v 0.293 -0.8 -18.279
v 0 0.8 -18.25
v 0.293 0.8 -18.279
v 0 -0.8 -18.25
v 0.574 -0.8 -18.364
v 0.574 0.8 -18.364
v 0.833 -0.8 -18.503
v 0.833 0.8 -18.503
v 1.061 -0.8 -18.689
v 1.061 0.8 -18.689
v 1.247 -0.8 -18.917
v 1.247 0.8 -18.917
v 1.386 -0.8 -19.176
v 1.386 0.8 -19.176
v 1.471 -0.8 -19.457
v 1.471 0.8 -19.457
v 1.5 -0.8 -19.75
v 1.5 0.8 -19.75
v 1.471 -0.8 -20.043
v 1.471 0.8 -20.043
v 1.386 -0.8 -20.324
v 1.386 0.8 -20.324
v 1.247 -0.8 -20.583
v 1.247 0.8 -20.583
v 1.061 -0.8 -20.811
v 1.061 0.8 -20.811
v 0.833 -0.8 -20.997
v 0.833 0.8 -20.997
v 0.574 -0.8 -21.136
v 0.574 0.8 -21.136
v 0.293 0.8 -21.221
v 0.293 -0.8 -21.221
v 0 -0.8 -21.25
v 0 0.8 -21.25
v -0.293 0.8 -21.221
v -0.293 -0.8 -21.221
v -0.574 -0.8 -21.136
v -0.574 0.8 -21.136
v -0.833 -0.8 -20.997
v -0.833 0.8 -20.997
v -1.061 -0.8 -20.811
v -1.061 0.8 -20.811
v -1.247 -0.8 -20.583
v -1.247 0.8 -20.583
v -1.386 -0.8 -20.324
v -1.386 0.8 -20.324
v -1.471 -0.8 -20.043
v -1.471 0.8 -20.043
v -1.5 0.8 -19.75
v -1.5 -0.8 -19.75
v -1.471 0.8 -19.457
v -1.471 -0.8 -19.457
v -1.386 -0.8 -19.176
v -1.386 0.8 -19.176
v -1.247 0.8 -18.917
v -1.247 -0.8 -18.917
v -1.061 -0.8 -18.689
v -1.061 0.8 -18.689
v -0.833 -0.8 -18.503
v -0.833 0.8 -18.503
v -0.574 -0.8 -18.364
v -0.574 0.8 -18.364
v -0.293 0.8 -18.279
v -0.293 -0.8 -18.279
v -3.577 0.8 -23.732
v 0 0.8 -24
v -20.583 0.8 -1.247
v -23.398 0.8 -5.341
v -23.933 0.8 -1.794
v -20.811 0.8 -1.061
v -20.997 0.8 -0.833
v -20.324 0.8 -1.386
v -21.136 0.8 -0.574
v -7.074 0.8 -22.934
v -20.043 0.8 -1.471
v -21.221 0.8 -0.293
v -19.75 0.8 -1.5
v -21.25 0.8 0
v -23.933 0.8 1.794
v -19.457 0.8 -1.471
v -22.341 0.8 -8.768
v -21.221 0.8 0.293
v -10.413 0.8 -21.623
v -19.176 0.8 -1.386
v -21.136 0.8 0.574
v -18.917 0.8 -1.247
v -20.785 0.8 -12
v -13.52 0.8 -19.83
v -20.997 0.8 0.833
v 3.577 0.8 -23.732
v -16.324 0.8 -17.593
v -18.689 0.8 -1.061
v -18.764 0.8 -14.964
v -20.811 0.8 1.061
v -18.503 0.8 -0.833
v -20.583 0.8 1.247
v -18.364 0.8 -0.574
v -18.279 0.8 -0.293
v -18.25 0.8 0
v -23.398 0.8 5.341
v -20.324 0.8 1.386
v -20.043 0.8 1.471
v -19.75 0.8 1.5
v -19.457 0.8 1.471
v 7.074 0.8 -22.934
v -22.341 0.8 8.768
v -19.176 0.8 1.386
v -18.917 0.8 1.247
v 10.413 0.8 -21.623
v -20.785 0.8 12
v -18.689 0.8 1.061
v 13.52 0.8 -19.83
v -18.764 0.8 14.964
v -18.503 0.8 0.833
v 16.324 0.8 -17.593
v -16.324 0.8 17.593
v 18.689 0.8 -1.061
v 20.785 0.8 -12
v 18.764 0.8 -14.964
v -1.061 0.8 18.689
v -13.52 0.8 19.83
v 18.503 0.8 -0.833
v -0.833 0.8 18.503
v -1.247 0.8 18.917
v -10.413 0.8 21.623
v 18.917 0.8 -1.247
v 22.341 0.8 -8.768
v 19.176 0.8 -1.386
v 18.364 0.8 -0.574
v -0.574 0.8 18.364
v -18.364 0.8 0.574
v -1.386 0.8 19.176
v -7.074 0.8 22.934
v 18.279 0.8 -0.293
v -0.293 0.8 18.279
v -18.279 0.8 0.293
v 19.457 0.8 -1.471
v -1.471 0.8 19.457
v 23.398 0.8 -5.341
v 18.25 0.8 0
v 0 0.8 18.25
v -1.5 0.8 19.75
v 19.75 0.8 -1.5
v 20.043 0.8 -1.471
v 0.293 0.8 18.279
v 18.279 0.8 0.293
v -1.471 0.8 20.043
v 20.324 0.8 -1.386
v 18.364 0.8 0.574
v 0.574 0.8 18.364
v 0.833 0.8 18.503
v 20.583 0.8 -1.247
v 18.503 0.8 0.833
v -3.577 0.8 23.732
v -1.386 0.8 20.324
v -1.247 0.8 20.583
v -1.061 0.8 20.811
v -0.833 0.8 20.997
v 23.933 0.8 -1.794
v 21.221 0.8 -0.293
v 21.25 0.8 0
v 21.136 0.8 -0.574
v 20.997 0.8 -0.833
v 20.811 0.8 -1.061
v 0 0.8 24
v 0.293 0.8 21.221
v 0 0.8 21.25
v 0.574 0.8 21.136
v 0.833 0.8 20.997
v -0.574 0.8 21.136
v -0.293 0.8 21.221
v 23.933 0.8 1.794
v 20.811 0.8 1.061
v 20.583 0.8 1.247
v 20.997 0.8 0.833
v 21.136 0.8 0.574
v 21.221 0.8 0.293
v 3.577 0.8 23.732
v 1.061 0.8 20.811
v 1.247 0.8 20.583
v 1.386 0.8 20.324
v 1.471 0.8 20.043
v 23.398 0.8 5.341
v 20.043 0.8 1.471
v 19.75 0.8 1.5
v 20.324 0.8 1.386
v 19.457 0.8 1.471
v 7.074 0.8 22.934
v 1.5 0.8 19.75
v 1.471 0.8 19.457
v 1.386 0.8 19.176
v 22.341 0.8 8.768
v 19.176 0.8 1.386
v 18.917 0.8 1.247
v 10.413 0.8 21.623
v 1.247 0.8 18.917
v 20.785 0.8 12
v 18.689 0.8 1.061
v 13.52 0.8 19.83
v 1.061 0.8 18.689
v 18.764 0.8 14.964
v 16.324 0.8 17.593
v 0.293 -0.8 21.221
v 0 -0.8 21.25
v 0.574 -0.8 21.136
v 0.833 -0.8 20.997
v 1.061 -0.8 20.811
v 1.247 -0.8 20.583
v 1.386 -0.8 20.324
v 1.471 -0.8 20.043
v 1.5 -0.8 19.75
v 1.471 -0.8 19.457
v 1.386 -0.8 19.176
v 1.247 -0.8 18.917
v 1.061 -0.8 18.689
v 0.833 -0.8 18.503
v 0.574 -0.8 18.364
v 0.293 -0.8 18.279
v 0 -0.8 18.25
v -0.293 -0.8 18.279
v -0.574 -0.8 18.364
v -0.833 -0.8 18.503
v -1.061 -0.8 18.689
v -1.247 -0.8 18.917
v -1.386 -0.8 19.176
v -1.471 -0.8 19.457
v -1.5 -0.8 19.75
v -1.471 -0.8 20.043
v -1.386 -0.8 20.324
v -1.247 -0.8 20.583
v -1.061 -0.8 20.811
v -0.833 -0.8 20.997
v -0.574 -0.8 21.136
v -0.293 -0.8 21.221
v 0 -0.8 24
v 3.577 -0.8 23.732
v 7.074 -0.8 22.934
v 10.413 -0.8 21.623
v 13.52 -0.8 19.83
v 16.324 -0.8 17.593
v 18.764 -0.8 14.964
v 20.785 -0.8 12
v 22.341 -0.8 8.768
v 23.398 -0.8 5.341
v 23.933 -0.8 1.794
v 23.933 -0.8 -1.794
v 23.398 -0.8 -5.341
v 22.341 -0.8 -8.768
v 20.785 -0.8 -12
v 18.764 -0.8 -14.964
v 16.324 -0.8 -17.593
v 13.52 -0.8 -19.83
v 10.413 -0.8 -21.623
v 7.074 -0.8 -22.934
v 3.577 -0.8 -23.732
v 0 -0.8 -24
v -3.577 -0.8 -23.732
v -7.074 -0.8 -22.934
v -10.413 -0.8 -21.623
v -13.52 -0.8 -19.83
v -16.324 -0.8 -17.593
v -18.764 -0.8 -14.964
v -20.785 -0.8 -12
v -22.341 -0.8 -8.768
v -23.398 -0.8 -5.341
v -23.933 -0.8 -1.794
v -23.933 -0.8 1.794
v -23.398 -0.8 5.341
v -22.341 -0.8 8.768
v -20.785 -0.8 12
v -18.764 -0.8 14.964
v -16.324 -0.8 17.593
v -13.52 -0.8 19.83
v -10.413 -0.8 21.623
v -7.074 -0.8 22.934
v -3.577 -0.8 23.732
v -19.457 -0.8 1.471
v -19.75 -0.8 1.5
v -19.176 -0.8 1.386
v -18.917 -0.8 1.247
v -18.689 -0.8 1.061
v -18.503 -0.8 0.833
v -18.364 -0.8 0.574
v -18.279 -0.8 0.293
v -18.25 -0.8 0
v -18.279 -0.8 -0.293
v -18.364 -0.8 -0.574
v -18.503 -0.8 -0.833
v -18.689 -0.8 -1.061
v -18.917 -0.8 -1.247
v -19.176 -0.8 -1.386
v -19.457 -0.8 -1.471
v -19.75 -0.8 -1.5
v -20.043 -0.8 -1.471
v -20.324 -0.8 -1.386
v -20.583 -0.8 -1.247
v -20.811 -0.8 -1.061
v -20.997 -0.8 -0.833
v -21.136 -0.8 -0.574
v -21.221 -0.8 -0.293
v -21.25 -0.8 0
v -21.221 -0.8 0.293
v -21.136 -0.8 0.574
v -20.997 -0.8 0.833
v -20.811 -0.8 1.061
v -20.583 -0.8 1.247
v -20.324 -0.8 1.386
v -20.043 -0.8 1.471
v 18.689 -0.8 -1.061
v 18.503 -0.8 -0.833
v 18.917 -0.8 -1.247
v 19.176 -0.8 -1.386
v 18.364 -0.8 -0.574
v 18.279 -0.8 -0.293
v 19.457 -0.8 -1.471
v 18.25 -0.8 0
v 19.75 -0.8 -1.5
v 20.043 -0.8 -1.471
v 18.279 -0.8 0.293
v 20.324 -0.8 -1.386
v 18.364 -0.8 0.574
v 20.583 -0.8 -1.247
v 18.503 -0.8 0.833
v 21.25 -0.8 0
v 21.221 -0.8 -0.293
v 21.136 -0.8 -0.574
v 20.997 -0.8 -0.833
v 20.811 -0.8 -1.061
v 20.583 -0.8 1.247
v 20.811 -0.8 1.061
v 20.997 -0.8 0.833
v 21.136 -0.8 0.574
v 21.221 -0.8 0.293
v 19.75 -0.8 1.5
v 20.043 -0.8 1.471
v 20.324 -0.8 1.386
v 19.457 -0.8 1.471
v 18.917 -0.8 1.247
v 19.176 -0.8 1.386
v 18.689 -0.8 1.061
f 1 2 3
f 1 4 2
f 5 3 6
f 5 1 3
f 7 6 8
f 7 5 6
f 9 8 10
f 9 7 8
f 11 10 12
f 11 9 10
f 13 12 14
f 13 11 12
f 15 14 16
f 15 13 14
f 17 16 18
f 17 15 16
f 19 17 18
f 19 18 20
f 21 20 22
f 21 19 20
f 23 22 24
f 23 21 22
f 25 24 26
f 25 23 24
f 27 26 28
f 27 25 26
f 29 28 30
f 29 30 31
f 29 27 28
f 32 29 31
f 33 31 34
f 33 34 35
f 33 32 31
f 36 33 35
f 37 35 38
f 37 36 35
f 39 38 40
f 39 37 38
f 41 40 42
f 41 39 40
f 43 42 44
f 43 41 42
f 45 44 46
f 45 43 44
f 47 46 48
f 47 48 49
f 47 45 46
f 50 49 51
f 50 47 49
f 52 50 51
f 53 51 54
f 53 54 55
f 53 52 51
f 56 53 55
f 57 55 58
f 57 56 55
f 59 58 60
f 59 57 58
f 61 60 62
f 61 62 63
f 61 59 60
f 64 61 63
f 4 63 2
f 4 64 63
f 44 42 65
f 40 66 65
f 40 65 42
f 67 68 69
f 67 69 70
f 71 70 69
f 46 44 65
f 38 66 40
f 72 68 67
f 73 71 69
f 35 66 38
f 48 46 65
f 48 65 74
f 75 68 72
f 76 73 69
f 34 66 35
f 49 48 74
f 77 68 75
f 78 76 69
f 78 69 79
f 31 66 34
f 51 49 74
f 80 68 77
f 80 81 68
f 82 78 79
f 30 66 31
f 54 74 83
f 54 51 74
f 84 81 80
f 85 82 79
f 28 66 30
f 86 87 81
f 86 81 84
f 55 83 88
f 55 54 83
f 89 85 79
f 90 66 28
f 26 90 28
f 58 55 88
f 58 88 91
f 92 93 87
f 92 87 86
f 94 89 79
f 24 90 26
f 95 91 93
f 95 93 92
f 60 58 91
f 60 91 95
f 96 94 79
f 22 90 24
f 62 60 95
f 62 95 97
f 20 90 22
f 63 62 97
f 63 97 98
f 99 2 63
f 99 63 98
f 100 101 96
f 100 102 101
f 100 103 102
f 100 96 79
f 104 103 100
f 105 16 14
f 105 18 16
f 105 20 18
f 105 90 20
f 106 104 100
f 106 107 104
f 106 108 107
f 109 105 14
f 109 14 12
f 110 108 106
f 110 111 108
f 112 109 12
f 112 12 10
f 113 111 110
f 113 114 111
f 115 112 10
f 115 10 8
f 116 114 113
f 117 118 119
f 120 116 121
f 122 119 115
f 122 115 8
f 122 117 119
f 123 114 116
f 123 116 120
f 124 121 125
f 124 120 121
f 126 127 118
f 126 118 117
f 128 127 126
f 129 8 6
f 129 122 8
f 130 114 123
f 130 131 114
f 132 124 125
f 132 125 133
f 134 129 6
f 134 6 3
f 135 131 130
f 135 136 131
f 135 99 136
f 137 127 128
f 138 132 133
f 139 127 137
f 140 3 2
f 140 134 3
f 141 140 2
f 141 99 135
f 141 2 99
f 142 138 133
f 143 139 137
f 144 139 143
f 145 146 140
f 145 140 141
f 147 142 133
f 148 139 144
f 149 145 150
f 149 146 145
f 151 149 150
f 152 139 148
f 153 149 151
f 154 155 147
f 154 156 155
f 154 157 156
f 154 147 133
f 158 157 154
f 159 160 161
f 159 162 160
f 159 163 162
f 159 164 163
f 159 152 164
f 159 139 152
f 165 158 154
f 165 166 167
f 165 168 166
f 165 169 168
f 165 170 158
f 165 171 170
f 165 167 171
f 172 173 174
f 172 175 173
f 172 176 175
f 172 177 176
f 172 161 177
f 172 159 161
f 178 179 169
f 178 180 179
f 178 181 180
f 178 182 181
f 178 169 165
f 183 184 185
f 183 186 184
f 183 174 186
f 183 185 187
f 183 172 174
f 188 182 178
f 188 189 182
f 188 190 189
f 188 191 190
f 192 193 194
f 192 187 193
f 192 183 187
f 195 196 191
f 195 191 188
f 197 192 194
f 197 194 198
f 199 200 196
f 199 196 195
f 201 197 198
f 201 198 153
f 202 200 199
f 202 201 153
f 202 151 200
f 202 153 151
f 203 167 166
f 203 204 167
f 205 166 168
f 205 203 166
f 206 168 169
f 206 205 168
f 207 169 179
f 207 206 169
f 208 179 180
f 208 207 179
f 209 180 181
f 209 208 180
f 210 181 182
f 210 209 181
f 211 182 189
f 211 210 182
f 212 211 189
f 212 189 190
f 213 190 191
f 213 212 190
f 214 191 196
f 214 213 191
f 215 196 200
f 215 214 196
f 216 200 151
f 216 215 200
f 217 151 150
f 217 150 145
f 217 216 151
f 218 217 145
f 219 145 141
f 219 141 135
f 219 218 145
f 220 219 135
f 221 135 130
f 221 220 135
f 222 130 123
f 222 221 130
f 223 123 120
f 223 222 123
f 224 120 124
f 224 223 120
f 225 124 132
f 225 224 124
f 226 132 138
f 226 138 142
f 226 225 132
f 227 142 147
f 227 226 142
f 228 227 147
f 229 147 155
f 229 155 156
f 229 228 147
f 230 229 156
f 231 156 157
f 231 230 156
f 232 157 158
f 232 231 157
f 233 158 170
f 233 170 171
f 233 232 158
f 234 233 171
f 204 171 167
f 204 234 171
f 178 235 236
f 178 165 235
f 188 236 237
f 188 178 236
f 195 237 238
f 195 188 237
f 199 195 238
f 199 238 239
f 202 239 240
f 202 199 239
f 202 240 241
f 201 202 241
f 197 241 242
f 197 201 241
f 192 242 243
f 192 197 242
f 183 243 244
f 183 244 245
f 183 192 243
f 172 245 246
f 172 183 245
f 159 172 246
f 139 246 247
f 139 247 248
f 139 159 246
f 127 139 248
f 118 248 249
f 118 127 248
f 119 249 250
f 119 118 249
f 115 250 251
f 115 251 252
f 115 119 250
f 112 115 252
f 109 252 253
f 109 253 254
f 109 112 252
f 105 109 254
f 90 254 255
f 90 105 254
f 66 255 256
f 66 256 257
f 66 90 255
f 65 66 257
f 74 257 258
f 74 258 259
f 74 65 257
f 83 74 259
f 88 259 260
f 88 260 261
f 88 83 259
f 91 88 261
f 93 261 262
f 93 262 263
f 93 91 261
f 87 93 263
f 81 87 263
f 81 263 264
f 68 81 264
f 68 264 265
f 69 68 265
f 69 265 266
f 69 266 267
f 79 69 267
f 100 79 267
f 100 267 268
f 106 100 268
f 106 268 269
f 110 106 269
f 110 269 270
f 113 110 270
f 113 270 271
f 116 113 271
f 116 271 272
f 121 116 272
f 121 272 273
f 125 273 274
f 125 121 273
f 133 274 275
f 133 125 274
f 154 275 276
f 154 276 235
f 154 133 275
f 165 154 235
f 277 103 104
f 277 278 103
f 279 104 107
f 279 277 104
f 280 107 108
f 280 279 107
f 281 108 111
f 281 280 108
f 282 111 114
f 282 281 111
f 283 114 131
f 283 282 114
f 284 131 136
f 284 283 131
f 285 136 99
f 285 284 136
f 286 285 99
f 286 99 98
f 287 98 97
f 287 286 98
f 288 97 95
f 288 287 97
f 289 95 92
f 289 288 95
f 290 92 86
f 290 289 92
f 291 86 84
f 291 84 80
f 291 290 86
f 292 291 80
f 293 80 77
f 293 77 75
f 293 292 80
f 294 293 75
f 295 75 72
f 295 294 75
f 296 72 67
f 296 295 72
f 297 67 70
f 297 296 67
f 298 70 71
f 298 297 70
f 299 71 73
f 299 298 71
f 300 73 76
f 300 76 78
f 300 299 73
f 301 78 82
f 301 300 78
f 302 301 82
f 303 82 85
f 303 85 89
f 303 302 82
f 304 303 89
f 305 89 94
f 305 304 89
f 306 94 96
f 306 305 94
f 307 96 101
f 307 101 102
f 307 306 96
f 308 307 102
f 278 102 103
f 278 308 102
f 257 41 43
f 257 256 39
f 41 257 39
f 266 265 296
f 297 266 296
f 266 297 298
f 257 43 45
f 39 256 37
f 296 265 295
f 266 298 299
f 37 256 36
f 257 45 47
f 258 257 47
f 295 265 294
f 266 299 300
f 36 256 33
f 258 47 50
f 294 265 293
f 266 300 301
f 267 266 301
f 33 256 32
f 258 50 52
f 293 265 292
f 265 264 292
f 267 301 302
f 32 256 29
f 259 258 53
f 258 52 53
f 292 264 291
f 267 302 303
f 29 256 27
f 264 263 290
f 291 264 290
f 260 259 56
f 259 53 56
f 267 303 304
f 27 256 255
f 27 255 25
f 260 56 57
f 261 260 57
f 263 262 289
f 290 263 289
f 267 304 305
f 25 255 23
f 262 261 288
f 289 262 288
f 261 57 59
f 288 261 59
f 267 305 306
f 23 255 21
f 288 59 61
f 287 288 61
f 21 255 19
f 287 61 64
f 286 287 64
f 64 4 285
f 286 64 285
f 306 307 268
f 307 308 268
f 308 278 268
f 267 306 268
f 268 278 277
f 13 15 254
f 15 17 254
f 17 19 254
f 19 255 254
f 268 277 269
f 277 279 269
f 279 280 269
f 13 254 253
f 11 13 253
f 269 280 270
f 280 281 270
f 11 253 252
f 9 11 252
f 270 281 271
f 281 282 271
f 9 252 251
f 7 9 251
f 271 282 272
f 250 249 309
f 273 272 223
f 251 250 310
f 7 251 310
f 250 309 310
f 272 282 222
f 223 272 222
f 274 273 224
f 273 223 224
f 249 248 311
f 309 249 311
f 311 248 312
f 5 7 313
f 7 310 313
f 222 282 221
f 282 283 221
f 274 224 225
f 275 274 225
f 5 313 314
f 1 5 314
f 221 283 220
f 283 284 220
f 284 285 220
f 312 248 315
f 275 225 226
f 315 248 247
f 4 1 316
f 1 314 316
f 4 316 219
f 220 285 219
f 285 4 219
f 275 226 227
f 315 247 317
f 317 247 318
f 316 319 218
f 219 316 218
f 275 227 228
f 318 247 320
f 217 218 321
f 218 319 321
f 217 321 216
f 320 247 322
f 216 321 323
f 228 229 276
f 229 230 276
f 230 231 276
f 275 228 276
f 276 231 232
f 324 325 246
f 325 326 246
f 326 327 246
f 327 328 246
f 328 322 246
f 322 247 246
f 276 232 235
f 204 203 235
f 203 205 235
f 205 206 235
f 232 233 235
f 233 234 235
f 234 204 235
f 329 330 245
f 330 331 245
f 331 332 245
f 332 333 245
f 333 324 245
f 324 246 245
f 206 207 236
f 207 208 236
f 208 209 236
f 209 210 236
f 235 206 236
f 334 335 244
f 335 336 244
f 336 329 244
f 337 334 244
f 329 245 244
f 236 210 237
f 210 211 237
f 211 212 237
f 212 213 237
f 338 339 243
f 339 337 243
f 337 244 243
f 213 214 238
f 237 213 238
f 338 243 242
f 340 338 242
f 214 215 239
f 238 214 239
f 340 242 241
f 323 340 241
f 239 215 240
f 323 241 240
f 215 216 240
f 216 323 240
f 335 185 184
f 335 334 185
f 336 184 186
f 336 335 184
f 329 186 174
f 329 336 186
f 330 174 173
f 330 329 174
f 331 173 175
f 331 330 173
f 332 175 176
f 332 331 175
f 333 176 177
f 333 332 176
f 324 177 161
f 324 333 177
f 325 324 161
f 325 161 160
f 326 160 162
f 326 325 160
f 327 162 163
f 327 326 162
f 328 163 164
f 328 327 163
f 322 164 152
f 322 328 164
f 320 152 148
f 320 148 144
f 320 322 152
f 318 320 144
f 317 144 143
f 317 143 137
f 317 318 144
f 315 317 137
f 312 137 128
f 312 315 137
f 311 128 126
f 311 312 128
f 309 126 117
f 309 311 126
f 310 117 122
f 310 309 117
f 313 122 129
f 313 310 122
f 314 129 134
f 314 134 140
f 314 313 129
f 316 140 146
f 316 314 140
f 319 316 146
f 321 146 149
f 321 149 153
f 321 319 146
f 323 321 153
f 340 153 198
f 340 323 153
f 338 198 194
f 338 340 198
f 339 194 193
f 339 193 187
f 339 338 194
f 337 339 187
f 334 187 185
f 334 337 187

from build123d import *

# Parameters (mm, degrees)
SKETCH1_R           = 24
SKETCH1_R_2         = 1.5
BOSS_EXTRUDE1_DEPTH = 0.8


with BuildPart() as part:
    # Sketch1 → Boss-Extrude1 (new, symmetric)
    with BuildSketch(Plane(origin=(0, 0, 0), x_dir=(1, 0, 0), z_dir=(0, 1, 0))):
        with Locations(Location((0, 0, 0), (0, 0, 270))):
            Circle(SKETCH1_R)
        with Locations(Location((-19.75, 0, 0), (0, 0, 270))):
            Circle(SKETCH1_R_2, mode=Mode.SUBTRACT)
        with Locations(Location((0, -19.75, 0), (0, 0, 270))):
            Circle(SKETCH1_R_2, mode=Mode.SUBTRACT)
        with Locations(Location((19.75, 0, 0), (0, 0, 270))):
            Circle(SKETCH1_R_2, mode=Mode.SUBTRACT)
        with Locations(Location((0, 19.75, 0), (0, 0, 270))):
            Circle(SKETCH1_R_2, mode=Mode.SUBTRACT)
    extrude(amount=BOSS_EXTRUDE1_DEPTH, both=True)


solid = part.part
